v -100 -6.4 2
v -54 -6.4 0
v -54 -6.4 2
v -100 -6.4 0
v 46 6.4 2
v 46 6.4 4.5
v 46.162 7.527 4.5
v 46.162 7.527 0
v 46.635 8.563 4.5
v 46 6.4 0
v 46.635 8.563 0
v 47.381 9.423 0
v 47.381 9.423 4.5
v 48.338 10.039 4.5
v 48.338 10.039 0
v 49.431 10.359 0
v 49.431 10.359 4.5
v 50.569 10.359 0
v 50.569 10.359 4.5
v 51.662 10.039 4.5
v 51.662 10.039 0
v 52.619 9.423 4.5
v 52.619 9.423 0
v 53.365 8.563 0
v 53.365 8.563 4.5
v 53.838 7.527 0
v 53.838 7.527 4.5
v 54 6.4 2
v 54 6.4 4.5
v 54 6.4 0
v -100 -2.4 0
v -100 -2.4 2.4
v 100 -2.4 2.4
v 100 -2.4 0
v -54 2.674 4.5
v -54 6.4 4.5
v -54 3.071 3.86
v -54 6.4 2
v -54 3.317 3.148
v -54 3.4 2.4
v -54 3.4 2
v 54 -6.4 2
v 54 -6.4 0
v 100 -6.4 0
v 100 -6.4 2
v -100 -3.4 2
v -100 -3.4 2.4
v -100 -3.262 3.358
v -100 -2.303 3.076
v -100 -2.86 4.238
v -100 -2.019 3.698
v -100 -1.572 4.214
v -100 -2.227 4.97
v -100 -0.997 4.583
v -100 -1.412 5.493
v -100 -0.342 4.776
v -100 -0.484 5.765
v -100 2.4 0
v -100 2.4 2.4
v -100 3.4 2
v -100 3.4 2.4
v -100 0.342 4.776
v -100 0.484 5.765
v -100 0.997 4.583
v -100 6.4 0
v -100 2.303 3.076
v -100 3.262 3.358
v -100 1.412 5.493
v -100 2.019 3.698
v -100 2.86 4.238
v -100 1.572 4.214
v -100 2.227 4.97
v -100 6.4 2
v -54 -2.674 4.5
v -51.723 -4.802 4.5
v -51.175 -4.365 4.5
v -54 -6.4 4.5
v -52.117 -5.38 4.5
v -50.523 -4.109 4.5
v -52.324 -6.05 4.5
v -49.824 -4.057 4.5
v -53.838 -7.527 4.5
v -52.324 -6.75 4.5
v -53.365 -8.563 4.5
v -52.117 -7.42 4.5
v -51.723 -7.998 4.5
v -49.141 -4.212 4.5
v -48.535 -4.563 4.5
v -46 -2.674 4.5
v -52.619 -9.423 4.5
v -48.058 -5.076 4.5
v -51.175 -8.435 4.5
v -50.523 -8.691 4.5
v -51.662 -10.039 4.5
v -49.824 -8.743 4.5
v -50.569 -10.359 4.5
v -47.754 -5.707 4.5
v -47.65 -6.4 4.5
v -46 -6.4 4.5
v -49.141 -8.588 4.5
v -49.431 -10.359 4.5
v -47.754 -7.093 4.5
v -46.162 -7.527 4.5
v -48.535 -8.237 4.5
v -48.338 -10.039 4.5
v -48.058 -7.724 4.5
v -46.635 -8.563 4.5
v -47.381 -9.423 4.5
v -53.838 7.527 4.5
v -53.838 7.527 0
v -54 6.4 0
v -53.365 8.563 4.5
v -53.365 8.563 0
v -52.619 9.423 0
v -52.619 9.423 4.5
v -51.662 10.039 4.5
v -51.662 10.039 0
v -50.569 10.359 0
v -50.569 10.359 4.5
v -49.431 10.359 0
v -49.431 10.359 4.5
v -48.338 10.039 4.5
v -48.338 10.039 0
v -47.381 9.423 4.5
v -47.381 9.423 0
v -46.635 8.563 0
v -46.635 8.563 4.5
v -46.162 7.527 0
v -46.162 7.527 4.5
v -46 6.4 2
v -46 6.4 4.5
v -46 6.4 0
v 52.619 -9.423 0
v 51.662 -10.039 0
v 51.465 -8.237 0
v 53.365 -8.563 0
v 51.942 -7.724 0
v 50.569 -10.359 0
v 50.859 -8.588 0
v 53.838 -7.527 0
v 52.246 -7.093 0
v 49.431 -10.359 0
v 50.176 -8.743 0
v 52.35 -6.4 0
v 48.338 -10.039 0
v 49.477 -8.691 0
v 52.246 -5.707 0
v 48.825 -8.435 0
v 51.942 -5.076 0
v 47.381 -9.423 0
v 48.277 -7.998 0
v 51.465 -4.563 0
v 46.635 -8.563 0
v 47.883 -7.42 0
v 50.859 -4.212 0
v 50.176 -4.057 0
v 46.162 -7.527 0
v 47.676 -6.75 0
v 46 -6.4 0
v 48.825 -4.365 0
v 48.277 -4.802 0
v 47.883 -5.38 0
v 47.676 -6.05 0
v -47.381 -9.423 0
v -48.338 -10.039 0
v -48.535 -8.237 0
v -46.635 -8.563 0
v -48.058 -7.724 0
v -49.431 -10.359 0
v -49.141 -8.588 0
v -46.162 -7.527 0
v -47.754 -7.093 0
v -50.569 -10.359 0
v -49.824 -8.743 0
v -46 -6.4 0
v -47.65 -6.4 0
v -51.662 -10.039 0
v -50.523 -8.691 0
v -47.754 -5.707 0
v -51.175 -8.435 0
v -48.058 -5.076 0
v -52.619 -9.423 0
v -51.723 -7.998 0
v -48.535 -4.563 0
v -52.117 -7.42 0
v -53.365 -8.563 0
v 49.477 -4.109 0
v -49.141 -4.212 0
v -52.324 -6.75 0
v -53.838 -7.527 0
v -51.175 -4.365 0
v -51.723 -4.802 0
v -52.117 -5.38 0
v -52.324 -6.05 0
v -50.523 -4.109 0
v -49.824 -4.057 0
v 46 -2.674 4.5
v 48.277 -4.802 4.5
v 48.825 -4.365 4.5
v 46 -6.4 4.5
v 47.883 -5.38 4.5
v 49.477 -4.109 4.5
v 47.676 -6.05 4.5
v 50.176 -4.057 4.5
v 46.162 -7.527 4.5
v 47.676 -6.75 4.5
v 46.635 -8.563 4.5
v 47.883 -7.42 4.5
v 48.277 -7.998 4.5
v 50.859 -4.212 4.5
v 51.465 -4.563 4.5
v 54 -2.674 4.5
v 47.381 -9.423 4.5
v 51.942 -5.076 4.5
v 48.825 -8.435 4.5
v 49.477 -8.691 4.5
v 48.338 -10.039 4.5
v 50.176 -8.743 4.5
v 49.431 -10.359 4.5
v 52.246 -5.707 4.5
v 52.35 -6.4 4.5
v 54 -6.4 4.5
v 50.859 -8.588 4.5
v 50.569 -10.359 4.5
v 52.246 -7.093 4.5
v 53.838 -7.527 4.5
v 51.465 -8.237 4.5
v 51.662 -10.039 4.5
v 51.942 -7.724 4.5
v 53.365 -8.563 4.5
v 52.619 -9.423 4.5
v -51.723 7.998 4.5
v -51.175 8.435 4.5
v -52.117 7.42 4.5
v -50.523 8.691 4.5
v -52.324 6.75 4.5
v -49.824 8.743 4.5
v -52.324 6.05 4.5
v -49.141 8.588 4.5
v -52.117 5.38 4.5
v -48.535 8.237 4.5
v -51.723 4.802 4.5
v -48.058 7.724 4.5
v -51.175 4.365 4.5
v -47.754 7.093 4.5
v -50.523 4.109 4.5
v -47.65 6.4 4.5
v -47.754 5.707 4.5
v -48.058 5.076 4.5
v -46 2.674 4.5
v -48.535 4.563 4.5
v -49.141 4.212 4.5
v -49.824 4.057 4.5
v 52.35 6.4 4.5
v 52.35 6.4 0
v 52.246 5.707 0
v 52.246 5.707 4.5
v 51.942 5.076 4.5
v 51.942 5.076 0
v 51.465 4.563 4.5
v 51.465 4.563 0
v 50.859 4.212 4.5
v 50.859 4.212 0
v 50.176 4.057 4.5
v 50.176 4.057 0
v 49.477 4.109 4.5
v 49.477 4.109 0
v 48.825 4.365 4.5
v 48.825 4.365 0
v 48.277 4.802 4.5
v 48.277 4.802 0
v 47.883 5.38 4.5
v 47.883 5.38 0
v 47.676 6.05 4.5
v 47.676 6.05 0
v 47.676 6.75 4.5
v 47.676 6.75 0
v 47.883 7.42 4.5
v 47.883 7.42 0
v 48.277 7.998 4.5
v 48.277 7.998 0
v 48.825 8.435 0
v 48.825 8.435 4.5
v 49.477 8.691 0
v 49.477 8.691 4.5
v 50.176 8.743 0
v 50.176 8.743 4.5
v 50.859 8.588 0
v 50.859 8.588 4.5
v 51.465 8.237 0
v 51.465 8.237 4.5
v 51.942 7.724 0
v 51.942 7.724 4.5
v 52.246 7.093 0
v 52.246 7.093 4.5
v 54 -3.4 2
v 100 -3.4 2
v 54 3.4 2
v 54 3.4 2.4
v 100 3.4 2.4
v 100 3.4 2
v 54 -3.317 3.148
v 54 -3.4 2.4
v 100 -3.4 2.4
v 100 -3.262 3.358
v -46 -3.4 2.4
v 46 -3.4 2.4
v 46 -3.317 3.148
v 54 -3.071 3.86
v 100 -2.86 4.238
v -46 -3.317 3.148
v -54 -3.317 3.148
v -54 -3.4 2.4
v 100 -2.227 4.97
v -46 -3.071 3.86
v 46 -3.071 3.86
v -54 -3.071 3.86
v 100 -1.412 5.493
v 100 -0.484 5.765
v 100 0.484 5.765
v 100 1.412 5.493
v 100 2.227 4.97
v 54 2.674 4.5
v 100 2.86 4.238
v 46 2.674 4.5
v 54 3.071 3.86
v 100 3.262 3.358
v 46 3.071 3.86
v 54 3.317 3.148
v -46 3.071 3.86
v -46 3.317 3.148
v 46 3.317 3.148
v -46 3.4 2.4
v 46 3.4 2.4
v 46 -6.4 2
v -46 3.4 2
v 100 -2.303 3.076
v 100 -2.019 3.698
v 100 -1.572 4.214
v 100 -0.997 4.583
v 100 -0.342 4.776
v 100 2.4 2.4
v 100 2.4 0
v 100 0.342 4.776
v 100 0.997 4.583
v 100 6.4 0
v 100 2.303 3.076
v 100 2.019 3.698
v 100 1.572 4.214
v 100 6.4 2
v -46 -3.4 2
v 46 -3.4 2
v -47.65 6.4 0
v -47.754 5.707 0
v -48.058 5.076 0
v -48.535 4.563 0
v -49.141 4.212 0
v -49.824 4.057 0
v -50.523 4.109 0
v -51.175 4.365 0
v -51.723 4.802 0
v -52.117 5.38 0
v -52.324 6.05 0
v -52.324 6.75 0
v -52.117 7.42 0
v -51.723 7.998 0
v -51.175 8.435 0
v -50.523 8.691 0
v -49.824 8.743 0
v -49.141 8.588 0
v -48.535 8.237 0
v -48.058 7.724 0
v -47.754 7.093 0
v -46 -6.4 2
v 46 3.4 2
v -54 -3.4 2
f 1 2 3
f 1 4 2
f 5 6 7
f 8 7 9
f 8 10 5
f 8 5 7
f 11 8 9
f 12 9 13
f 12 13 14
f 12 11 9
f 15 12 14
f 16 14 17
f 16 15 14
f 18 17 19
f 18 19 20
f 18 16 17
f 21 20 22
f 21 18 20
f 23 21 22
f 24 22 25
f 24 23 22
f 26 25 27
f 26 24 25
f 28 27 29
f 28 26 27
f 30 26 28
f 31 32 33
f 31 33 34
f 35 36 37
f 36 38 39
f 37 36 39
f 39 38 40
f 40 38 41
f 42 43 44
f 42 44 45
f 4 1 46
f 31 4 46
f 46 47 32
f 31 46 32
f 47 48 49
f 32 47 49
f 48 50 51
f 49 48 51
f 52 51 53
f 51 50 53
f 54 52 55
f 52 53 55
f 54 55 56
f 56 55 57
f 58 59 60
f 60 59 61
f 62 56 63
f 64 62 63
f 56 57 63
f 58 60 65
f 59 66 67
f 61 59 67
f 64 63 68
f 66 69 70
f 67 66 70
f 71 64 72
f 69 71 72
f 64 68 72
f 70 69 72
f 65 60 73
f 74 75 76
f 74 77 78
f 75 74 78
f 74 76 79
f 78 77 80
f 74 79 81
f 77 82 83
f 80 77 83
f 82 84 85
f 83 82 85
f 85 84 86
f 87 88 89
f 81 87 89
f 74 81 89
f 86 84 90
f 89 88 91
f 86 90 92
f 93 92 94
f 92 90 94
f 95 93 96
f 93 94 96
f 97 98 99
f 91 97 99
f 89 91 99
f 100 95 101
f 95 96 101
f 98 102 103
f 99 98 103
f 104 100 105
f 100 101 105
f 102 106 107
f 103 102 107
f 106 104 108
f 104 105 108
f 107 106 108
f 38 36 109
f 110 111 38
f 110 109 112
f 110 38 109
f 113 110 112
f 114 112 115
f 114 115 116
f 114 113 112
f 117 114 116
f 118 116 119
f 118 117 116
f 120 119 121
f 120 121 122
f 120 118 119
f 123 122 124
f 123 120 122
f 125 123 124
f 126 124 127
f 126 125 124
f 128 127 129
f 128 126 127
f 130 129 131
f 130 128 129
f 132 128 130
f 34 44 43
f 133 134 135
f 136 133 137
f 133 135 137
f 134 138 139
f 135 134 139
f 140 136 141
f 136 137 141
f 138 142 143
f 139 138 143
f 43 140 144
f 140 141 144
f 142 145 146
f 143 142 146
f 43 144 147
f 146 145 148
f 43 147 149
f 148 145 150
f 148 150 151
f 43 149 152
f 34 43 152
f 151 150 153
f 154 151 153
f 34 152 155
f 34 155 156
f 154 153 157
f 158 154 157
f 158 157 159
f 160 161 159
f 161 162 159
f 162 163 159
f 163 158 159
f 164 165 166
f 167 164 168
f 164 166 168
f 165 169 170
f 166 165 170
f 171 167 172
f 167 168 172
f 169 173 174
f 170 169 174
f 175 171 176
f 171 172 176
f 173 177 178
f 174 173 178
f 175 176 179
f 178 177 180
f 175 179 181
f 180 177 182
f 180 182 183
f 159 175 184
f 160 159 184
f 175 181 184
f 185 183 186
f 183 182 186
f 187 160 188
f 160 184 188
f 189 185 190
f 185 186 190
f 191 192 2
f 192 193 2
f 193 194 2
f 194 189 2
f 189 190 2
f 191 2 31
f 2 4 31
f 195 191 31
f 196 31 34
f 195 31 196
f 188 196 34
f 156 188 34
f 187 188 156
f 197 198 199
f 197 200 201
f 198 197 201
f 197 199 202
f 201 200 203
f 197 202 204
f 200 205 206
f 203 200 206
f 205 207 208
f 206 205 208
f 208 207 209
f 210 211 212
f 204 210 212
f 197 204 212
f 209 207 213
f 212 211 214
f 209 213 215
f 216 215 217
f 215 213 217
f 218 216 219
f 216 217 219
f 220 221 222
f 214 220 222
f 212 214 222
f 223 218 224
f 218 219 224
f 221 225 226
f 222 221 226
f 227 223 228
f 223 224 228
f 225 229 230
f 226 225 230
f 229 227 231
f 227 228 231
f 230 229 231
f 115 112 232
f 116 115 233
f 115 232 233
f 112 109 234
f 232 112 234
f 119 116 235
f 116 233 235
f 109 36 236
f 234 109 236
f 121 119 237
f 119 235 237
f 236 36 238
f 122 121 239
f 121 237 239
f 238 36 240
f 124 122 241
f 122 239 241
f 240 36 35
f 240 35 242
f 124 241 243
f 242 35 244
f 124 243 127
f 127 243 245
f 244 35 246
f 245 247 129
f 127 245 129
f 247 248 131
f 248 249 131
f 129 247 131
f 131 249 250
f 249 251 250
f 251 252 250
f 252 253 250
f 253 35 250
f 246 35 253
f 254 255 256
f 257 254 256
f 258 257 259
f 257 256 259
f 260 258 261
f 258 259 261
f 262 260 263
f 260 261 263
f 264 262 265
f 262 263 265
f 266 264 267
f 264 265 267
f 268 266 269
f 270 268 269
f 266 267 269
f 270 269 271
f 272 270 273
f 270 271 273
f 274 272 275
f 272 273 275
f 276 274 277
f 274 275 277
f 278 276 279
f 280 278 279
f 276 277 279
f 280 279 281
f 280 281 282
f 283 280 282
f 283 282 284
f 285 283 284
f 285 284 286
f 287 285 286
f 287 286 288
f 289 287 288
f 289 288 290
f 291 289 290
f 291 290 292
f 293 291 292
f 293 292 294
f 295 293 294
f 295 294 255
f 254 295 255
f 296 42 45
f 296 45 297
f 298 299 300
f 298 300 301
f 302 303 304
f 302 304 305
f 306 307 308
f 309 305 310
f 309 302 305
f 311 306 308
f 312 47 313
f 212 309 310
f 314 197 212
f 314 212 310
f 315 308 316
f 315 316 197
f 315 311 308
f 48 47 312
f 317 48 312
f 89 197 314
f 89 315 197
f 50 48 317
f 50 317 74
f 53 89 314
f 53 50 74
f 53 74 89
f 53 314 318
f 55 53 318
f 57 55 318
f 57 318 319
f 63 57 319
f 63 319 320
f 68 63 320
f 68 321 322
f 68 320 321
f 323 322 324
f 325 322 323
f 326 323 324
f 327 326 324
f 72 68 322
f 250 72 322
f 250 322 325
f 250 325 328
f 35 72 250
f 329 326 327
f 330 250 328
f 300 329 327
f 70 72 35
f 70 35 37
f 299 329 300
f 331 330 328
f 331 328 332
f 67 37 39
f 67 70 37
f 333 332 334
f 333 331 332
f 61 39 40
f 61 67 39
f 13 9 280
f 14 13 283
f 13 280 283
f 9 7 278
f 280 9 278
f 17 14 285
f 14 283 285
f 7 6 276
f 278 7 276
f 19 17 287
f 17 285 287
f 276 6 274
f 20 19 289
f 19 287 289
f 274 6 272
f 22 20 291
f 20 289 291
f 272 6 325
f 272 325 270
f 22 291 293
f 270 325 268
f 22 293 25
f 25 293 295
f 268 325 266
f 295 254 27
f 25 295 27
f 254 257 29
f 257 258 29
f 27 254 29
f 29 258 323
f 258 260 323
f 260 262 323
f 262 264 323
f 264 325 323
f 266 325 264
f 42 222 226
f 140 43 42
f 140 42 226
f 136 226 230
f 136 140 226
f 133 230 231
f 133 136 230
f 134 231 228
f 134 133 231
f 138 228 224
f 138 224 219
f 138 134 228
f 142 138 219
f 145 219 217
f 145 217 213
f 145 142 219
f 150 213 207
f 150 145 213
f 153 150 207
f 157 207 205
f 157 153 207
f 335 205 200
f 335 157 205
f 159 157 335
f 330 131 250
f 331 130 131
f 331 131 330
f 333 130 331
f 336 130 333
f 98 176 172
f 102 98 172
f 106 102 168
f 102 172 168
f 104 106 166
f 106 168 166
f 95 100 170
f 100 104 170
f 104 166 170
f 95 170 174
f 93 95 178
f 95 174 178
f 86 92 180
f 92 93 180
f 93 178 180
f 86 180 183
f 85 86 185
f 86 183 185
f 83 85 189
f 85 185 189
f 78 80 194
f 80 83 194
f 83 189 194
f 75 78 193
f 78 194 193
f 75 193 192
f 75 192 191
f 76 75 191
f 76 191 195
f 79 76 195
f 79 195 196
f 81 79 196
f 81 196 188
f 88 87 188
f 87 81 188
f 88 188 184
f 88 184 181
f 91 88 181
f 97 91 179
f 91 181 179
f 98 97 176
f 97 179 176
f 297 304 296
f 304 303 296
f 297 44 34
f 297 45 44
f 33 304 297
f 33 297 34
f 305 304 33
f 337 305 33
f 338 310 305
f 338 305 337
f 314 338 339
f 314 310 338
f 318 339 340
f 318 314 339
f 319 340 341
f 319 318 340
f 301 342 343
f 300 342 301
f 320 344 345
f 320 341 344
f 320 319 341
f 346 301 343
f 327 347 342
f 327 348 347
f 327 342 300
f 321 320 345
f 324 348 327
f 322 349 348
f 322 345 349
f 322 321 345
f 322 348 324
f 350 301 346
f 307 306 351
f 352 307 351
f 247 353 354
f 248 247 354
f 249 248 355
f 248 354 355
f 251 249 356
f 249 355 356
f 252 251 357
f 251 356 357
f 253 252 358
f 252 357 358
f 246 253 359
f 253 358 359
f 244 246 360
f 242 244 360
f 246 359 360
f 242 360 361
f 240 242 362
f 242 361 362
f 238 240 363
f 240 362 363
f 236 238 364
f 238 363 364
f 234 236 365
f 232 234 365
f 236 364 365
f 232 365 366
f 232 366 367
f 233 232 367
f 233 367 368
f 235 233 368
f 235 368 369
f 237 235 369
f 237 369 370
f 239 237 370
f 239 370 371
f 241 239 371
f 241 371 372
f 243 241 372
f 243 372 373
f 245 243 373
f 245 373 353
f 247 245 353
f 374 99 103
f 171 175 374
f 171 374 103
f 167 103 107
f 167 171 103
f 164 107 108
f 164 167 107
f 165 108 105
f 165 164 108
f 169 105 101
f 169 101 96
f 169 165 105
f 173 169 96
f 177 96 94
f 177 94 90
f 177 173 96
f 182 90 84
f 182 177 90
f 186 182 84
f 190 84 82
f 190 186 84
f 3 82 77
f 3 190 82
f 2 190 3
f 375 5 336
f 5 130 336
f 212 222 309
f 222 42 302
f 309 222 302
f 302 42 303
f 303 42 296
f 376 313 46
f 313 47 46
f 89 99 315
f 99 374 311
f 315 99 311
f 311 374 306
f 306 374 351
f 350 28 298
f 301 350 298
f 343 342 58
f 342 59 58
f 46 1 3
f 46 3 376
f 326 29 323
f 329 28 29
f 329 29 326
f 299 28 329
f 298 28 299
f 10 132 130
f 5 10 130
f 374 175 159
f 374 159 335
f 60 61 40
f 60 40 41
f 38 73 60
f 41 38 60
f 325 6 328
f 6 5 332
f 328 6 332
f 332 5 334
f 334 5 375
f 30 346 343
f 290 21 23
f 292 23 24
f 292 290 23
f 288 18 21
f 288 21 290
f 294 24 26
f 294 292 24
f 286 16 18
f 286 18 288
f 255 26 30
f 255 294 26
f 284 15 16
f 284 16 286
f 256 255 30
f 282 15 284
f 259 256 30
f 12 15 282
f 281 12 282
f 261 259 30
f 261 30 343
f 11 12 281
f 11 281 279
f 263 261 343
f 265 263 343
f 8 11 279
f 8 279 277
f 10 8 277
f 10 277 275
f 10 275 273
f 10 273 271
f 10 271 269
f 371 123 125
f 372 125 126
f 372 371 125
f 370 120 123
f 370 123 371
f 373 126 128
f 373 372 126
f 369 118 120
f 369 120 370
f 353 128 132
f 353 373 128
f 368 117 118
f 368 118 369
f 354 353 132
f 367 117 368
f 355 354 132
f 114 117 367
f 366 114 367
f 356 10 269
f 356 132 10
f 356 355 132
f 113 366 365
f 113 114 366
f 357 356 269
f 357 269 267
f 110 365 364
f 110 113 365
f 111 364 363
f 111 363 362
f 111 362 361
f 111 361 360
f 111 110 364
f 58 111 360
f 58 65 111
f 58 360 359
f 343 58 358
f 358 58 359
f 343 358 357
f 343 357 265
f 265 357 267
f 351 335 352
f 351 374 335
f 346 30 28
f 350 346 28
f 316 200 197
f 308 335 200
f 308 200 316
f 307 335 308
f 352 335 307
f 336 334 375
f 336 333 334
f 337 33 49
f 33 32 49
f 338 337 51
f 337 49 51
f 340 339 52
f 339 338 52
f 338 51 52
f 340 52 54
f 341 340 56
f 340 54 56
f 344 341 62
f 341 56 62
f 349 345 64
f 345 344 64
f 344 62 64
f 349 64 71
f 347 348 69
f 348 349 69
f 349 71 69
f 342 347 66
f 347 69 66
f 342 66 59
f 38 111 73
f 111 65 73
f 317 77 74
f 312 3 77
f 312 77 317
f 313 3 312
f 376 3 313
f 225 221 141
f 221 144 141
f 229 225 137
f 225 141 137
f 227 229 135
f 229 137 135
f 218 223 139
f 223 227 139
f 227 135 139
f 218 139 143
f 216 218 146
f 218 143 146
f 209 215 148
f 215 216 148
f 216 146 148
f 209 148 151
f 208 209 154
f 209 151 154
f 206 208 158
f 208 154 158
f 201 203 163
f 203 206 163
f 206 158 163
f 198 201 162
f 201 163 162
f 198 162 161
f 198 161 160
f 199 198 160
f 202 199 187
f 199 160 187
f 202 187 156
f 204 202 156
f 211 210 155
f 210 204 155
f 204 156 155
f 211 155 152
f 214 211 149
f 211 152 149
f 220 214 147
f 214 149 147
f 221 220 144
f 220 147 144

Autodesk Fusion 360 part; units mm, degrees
sketch "Sketch1" plane through (0, 0, 0) normal (1, 0, 0) x (0, 1, 0) in component "CAN_Cable_Cover"
  circle A0 centre (0, 2.4) radius 2.4
  line L0 (-2.4, 2.4) -> (-2.4, 0)
  line L1 (0, 2.5) -> (0, 20)
  line L2 (2.4, 2.4) -> (2.4, 0)
  circle A1 centre (0, 2.4) radius 3.4
  line L3 (-3.4, 2.4) -> (-3.4, 0)
  line L4 (-3.4, 0) -> (-2.4, 0)
  line L5 (3.4, 2.4) -> (3.4, 0)
  line L6 (3.4, 0) -> (2.4, 0)
  line L7 (-3.4, 0) -> (-6.4, 0)
  line L8 (-6.4, 0) -> (-6.4, 2)
  line L9 (-6.4, 2) -> (-3.4, 2)
  line L10 (-3.4, 2) -> (-3.4, 0)
  line L11 (6.4, 2) -> (3.4, 2)
  line L12 (6.4, 0) -> (6.4, 2)
  line L13 (3.4, 0) -> (6.4, 0)
  line L14 (3.4, 2) -> (3.4, 0)
  dimension "d1" = 4.8
  dimension "d2" = 1
  dimension "d5" = 3
  dimension "d6" = 2
extrude "Extrude1" add sketch "Sketch1" along normal mid plane 200 contours A0 L0 L1 A1 L4 | A0 L1 L2 A1 L6 | A1 L3 L4 L10 | A1 L5 L6 L14 | L3 L7 L8 L9 L10 | L5 L11 L12 L13 L14 in component "CAN_Cable_Cover"
sketch "Sketch2" plane through (0, 0, 0) normal (0, 0, -1) x (1, 0, 0) in component "CAN_Cable_Cover"
  line L0 (-100, 2.4) -> (100, 2.4)
  line L1 (100, 2.4) -> (100, 6.4)
  line L2 (100, 6.4) -> (-100, 6.4)
  line L3 (-100, 6.4) -> (-100, 2.4)
  circle A0 centre (-50, 6.4) radius 4
  line L4 (0, -1.75) -> (0, -22.5)
  circle A1 centre (-50, 6.4) radius 2.35
  line L5 (-46, 6.4) -> (-46, 2.4)
  line L6 (-46, 2.4) -> (-50, 2.4)
  line L7 (-54, 6.4) -> (-54, 2.4)
  line L8 (-54, 2.4) -> (-50, 2.4)
  line L9 (1.75, 0) -> (22.5, 0)
  circle A2 centre (-50, -6.4) radius 4
  circle A3 centre (-50, -6.4) radius 2.35
  line L10 (-54, -6.4) -> (-54, -2.4)
  line L11 (-54, -2.4) -> (-50, -2.4)
  line L12 (-46, -2.4) -> (-50, -2.4)
  line L13 (-46, -6.4) -> (-46, -2.4)
  line L14 (46, -2.4) -> (50, -2.4)
  line L15 (54, 6.4) -> (54, 2.4)
  line L16 (54, 2.4) -> (50, 2.4)
  line L17 (46, 6.4) -> (46, 2.4)
  circle A4 centre (50, 6.4) radius 4
  circle A5 centre (50, -6.4) radius 4
  line L18 (54, -6.4) -> (54, -2.4)
  circle A6 centre (50, -6.4) radius 2.35
  line L19 (46, -6.4) -> (46, -2.4)
  circle A7 centre (50, 6.4) radius 2.35
  line L20 (54, -2.4) -> (50, -2.4)
  line L21 (46, 2.4) -> (50, 2.4)
  dimension "d7" = 8
  dimension "d8" = 50
  dimension "d9" = 4.7
extrude "Extrude2" add sketch "Sketch2" against normal blind 4.5 contours L0 A0 L7 L8 | L0 A0 L5 L6 | L2 A0 A1 | L2 A0 A1 | L0 L17 A4 L21 | L2 A4 A7 | L2 A4 A7 | L0 L15 L16 A4 | A2 | A2 L12 L13 | A2 L10 L11 | L14 A5 L19 | A5 L18 L20 | A5 in component "CAN_Cable_Cover"
extrude "Extrude3" cut sketch "Sketch2" against normal blind 16 contours L2 A1 | L2 A7 | A3 | A6 picked at (-50.2862, 5.6708) picked at (49.2594, 5.8292) in component "CAN_Cable_Cover"
component "CAN_Cable_Cover" placed x (1, 0, 0) y (0, 1, 0) z (0, 0, 1) at (0, 0, 0)
equation "d1 = cable_dia"
equation "d2 = tube_thick"
equation "d3 = length"
equation "d4 = 0deg 0'"
equation "d11 = 0deg 0'"
equation "d13 = 0deg 0'"
equation "length = 200 mm"
equation "cable_dia = 4.8 mm"
equation "tube_thick = 1 mm"
